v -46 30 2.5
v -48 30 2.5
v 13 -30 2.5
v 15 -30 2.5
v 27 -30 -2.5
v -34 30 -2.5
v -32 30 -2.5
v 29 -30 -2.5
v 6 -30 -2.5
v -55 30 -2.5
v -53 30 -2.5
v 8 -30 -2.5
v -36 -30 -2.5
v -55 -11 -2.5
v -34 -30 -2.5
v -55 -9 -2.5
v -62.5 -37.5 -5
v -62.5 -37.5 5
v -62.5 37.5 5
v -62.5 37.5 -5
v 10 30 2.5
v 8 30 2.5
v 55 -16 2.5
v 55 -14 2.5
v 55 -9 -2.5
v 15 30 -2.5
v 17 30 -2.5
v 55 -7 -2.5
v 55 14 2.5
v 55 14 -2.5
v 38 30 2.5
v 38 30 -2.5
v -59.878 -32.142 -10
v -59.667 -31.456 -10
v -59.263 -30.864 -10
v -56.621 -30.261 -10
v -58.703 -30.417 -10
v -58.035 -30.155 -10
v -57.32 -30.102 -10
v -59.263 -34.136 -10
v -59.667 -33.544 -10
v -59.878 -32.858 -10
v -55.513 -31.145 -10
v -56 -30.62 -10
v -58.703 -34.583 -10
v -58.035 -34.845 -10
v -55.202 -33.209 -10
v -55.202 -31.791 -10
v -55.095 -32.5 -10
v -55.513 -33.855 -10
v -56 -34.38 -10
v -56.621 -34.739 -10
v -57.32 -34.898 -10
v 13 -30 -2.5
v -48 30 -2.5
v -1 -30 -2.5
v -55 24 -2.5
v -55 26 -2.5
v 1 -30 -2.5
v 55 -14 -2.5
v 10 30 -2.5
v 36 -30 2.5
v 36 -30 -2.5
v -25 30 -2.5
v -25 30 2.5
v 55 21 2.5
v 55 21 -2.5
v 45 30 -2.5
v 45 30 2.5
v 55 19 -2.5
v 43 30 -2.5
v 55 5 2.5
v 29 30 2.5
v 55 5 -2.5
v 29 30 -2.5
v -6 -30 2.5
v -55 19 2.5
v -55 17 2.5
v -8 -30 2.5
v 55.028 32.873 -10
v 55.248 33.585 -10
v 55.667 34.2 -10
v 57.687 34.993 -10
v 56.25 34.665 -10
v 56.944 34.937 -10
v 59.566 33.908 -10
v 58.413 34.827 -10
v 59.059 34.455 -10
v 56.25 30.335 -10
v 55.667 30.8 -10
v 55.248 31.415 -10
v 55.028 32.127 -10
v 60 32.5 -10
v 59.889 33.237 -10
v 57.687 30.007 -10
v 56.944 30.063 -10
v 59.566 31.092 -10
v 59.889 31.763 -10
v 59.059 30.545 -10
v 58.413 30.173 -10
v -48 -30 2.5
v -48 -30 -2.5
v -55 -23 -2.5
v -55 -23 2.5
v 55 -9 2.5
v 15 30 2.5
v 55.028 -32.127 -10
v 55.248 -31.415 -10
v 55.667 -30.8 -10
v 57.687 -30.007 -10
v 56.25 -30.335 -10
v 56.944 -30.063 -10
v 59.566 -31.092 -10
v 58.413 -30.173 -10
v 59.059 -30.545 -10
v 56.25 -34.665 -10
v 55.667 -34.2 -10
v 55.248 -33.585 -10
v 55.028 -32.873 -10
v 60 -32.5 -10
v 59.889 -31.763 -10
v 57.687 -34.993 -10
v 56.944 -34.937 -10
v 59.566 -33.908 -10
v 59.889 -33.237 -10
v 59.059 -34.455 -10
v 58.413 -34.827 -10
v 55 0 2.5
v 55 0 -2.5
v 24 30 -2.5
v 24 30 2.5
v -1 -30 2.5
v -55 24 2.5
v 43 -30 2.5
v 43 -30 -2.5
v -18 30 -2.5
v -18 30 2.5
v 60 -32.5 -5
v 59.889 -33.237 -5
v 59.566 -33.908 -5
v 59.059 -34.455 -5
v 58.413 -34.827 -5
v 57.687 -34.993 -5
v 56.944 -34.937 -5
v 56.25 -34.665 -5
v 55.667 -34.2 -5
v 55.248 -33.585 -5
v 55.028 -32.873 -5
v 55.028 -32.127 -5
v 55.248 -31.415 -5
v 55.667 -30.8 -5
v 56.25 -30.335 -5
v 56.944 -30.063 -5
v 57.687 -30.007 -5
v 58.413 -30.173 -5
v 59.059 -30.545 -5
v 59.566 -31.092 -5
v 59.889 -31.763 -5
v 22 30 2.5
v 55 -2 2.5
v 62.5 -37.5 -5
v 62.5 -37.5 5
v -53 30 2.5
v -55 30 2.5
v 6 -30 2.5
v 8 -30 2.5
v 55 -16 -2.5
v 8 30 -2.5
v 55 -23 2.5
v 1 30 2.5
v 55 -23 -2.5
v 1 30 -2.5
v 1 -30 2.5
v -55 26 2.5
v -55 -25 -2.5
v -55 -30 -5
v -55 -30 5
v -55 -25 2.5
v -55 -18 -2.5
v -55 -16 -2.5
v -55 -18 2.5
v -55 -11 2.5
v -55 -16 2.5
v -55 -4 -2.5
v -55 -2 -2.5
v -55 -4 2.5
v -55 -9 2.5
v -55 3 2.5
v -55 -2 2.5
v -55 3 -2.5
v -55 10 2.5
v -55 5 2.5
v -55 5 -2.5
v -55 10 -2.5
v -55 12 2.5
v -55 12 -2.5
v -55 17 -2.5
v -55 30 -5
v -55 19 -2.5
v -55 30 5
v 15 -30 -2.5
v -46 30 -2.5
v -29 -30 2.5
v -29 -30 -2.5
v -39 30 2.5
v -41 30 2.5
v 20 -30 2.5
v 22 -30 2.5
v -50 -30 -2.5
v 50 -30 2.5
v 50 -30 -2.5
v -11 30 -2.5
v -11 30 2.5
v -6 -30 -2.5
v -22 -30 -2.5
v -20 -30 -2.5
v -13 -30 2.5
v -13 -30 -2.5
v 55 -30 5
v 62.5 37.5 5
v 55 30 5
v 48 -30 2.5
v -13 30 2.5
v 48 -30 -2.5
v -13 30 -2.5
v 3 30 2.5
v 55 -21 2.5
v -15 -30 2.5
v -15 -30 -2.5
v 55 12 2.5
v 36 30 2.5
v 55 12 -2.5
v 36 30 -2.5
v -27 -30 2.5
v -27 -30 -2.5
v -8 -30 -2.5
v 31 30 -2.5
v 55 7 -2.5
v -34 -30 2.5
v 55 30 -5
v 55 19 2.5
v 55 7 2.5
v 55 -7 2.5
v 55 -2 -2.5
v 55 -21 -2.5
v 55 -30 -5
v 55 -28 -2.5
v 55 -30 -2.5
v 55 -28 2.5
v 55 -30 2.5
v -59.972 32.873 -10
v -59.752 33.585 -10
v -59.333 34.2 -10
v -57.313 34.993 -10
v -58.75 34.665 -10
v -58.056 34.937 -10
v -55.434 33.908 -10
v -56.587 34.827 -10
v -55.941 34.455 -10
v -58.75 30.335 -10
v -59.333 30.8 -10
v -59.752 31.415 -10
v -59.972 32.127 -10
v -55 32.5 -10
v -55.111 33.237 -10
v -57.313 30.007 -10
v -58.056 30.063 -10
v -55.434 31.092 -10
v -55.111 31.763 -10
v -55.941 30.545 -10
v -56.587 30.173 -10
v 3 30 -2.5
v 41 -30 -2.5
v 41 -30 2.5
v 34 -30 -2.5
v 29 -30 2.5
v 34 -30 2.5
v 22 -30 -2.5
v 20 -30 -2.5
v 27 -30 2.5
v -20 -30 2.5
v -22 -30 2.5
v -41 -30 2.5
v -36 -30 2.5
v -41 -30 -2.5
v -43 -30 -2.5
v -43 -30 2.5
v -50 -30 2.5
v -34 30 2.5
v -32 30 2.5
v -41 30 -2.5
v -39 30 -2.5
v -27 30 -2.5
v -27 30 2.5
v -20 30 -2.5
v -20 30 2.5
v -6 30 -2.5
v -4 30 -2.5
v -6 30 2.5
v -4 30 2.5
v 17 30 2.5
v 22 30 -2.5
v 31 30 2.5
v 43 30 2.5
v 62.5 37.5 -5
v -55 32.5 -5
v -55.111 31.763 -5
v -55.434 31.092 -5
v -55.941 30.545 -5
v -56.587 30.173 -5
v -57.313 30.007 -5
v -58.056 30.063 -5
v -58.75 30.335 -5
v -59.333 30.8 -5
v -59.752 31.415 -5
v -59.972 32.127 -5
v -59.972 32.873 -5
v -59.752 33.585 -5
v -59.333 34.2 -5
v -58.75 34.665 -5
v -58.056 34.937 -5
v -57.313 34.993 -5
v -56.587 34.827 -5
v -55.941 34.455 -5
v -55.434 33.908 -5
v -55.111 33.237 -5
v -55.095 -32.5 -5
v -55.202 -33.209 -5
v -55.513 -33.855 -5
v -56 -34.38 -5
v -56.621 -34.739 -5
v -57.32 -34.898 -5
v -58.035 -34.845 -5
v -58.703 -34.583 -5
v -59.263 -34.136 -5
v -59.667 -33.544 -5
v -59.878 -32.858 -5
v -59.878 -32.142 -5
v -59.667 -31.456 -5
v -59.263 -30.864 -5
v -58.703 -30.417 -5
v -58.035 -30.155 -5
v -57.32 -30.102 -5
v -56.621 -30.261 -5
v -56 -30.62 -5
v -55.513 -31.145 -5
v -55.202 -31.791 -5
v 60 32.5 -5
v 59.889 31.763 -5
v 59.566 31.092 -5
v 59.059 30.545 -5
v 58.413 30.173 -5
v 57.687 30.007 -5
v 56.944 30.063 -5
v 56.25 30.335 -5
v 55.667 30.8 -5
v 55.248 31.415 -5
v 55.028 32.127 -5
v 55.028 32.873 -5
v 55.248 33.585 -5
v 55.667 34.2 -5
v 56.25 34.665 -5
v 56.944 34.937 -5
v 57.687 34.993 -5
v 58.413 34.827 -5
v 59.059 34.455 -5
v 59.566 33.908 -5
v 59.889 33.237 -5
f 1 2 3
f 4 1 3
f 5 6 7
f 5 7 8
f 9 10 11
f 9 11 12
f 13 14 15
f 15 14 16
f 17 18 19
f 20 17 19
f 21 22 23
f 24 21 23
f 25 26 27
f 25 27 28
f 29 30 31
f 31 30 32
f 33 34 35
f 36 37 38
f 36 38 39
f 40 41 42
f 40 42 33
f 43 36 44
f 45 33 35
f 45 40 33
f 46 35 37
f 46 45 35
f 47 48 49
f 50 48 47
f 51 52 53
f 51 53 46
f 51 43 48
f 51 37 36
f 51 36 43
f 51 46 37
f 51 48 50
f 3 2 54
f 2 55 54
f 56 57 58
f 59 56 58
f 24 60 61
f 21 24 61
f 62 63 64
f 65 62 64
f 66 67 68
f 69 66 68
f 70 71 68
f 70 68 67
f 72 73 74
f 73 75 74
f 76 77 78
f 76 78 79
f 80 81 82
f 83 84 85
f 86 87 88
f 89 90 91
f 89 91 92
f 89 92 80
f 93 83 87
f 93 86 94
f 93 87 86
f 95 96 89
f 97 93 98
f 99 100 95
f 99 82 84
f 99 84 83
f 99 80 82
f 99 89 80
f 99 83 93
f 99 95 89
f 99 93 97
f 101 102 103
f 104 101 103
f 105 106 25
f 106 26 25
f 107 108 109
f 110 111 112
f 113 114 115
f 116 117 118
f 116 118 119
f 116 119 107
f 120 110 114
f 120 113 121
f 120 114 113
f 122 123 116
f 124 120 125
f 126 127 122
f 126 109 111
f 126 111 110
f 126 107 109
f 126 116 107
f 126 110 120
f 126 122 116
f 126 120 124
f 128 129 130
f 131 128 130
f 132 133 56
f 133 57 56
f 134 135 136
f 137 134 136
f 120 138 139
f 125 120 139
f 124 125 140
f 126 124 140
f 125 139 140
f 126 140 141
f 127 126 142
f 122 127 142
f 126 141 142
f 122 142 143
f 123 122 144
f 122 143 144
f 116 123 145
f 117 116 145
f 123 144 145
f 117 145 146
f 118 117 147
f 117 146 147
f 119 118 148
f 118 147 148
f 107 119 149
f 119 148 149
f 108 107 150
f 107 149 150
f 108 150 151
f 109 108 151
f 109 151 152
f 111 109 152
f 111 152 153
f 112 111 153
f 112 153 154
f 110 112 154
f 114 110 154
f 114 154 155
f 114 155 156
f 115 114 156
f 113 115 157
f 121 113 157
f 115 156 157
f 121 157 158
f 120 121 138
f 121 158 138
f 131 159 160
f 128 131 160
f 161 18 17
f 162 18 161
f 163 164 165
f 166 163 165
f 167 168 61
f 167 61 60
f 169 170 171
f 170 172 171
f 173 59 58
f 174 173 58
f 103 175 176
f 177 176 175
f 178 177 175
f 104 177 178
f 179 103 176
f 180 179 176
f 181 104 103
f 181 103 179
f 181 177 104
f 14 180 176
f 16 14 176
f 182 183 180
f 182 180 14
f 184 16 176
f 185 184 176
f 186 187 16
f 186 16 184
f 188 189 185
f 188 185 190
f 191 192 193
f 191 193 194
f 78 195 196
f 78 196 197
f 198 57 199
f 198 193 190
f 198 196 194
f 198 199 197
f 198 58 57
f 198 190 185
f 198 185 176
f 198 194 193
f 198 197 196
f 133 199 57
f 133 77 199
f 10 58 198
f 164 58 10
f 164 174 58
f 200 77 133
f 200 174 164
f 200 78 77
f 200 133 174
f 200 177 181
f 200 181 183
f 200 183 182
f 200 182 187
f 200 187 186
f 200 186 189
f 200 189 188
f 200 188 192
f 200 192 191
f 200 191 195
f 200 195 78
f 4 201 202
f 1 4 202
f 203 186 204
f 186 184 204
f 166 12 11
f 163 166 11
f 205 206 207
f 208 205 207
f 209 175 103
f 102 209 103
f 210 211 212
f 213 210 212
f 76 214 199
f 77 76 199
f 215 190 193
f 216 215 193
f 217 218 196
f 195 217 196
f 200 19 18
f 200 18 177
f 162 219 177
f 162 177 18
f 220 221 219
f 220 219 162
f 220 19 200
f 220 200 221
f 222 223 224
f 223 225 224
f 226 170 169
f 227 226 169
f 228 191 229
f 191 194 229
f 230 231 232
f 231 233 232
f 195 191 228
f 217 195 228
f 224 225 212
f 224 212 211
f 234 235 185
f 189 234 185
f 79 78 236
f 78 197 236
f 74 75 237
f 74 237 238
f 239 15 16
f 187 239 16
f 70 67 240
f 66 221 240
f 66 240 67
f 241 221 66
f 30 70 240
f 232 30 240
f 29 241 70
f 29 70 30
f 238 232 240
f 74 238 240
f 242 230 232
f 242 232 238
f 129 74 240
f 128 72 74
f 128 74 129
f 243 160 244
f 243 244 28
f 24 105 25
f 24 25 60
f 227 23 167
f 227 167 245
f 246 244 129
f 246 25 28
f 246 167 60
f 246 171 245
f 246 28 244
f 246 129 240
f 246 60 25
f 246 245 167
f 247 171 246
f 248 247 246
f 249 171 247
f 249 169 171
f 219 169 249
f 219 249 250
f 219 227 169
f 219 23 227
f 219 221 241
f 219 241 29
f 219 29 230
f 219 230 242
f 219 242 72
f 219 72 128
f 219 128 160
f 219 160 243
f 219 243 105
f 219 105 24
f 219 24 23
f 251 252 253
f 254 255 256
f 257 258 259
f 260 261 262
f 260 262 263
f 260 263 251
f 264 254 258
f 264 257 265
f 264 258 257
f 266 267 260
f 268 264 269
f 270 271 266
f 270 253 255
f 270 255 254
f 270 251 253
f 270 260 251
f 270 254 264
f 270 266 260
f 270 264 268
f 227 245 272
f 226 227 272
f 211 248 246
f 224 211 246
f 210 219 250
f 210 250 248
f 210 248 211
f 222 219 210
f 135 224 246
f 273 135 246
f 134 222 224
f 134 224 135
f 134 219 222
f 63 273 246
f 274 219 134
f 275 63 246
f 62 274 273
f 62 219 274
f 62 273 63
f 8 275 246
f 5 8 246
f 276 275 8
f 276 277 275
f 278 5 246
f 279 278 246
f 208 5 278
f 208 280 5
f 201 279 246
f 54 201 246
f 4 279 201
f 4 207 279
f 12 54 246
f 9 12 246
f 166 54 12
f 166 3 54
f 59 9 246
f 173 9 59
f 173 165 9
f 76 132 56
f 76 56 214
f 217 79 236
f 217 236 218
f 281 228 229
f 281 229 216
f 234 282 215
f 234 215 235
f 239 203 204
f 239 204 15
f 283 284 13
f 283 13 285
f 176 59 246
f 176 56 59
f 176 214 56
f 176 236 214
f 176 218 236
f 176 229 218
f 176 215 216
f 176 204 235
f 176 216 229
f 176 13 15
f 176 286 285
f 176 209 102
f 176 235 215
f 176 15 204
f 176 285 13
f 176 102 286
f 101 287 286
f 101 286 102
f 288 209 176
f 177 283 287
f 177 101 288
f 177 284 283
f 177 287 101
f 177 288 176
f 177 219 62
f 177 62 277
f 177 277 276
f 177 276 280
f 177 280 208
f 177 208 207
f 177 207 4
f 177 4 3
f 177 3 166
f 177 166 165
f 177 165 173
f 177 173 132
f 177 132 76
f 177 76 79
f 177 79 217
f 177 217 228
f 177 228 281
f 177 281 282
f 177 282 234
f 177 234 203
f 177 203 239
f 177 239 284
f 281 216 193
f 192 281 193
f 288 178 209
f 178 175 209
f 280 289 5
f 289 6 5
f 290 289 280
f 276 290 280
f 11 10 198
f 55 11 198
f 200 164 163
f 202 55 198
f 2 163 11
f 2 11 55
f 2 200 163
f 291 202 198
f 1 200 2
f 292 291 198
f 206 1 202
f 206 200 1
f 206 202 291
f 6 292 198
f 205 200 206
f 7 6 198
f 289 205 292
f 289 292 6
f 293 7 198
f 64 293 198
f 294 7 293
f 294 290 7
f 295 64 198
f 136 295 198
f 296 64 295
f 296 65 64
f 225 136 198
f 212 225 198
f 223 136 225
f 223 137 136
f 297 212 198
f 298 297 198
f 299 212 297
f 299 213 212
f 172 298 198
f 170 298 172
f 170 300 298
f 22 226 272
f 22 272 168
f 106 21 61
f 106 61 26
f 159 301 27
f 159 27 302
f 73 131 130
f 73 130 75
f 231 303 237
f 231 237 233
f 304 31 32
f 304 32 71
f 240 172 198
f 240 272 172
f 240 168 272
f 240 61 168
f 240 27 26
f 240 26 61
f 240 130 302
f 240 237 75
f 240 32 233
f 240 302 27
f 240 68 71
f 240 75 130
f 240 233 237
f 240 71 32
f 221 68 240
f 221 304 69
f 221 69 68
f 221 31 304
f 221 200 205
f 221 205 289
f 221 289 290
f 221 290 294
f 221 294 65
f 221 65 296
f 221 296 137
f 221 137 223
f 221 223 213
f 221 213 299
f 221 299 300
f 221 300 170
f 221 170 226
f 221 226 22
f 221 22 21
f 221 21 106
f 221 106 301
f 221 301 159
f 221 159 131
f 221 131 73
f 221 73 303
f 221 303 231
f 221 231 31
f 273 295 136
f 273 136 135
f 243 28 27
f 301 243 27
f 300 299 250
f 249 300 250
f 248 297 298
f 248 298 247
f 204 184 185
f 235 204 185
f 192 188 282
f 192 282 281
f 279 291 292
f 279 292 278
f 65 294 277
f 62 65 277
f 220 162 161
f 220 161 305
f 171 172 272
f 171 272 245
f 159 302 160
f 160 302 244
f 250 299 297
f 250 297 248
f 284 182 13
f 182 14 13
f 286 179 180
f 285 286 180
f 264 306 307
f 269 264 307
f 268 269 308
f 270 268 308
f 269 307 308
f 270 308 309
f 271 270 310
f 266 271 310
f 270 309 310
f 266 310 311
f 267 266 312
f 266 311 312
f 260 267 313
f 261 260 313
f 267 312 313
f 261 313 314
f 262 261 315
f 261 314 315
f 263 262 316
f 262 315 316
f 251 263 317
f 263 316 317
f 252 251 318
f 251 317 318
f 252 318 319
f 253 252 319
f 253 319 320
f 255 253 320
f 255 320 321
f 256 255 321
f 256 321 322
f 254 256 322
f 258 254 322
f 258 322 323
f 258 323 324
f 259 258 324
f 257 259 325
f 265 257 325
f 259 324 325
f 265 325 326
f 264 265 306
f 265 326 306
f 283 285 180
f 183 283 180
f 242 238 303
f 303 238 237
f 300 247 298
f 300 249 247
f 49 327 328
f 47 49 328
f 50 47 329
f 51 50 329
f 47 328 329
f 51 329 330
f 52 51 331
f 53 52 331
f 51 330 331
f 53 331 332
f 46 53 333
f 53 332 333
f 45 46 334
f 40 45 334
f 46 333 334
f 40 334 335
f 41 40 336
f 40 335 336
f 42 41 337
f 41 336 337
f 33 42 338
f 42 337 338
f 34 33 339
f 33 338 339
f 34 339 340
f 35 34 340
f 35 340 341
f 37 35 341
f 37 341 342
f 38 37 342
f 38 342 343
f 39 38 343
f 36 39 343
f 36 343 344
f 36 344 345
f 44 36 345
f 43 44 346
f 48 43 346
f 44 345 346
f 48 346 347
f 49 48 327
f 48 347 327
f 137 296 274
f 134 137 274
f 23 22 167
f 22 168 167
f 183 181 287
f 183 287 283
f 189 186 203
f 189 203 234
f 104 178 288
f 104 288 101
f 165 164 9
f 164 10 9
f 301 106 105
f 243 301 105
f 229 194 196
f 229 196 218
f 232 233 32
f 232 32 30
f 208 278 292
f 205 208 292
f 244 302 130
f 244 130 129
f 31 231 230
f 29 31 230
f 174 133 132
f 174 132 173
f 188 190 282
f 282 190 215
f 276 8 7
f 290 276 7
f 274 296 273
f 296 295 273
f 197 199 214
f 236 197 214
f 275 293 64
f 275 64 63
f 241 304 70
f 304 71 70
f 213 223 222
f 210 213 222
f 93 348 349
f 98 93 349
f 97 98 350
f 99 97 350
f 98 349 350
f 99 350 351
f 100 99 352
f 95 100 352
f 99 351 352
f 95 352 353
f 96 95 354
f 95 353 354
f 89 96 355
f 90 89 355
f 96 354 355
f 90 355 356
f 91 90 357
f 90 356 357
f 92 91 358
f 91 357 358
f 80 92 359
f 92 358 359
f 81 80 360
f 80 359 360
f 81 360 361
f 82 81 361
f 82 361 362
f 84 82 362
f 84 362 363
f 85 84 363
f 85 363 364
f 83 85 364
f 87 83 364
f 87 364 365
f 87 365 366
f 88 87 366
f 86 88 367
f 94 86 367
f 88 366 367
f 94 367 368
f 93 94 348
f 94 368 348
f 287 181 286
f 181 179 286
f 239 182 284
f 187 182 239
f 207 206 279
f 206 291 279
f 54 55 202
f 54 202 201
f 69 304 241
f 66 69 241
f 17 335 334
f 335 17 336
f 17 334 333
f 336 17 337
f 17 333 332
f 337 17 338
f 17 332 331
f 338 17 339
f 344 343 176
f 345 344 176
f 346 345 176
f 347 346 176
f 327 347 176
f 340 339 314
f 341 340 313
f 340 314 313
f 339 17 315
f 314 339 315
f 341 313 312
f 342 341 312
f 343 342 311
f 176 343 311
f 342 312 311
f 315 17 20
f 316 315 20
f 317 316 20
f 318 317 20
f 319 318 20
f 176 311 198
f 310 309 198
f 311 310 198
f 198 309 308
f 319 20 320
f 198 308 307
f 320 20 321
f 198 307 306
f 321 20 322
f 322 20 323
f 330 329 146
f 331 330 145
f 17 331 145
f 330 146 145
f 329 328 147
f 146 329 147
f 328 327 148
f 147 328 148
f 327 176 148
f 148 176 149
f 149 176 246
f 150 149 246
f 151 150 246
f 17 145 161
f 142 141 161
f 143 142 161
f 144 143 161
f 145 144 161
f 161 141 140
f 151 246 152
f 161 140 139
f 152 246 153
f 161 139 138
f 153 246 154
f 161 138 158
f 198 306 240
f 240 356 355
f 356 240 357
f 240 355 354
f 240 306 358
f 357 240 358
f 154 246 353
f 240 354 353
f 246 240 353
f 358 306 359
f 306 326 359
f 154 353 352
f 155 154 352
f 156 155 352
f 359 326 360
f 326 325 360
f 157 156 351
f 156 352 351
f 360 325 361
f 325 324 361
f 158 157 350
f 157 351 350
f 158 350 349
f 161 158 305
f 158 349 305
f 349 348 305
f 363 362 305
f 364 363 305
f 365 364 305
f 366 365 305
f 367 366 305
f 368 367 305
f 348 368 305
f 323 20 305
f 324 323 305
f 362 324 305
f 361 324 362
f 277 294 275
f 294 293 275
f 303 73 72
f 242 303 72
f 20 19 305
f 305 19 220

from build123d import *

# Parameters (mm, degrees)
F0_W     = 125
F0_H     = 75
F1_DEPTH = 5
F2_DEPTH = 2.5
F3_R     = 2.405164
F3_R_2   = 2.5
F4_DEPTH = 5


with BuildPart() as f1:
    # F0 (on Top) → F1 (new body, symmetric)
    with BuildSketch(Plane.XY):
        Rectangle(F0_W, F0_H)
        Polygon((-55, 26), (-55, 30), (-53, 30), (-48, 30), (-46, 30), (-41, 30), (-39, 30), (-34, 30), (-32, 30), (-27, 30), (-25, 30), (-20, 30), (-18, 30), (-13, 30), (-11, 30), (-6, 30), (-4, 30), (1, 30), (3, 30), (8, 30), (10, 30), (15, 30), (17, 30), (22, 30), (24, 30), (29, 30), (31, 30), (36, 30), (38, 30), (43, 30), (45, 30), (55, 30), (55, 20.999727), (55, 18.999727), (55, 13.999727), (55, 11.999727), (55, 6.999727), (55, 4.999727), (55, -0.000273), (55, -2.000273), (55, -7.000273), (55, -9.000273), (55, -14.000273), (55, -16.000273), (55, -21.000273), (55, -23.000273), (55, -28), (55, -30), (50, -30), (48, -30), (43, -30), (41, -30), (36, -30), (34, -30), (29, -30), (27, -30), (22, -30), (20, -30), (15, -30), (13, -30), (8, -30), (6, -30), (1, -30), (-1, -30), (-6, -30), (-8, -30), (-13, -30), (-15, -30), (-20, -30), (-22, -30), (-27, -30), (-29, -30), (-34, -30), (-36, -30), (-41, -30), (-43, -30), (-48, -30), (-50, -30), (-55, -30), (-55, -25), (-55, -23), (-55, -18), (-55, -16), (-55, -11), (-55, -9), (-55, -4), (-55, -2), (-55, 3), (-55, 5), (-55, 10), (-55, 12), (-55, 17), (-55, 19), (-55, 24), align=None, mode=Mode.SUBTRACT)
    extrude(amount=F1_DEPTH, both=True)

    # F0 (on Top) → F2 (join, symmetric)
    with BuildSketch(Plane.XY):
        Polygon((-48, -30), (-55, -23), (-55, -25), (-50, -30), align=None)
        Polygon((-41, -30), (-55, -16), (-55, -18), (-43, -30), align=None)
        Polygon((-34, -30), (-55, -9), (-55, -11), (-36, -30), align=None)
        Polygon((-27, -30), (-55, -2), (-55, -4), (-29, -30), align=None)
        Polygon((-20, -30), (-55, 5), (-55, 3), (-22, -30), align=None)
        Polygon((-13, -30), (-55, 12), (-55, 10), (-15, -30), align=None)
        Polygon((-6, -30), (-55, 19), (-55, 17), (-8, -30), align=None)
        Polygon((1, -30), (-55, 26), (-55, 24), (-1, -30), align=None)
        Polygon((-53, 30), (-55, 30), (6, -30), (8, -30), align=None)
        Polygon((-46, 30), (-48, 30), (13, -30), (15, -30), align=None)
        Polygon((-39, 30), (-41, 30), (20, -30), (22, -30), align=None)
        Polygon((-32, 30), (-34, 30), (27, -30), (29, -30), align=None)
        Polygon((-25, 30), (-27, 30), (34, -30), (36, -30), align=None)
        Polygon((-18, 30), (-20, 30), (41, -30), (43, -30), align=None)
        Polygon((-11, 30), (-13, 30), (48, -30), (50, -30), align=None)
        Polygon((3, 30), (1, 30), (55, -23.000273), (55, -21.000273), align=None)
        Polygon((10, 30), (8, 30), (55, -16.000273), (55, -14.000273), align=None)
        Polygon((45, 30), (43, 30), (55, 18.999727), (55, 20.999727), align=None)
        Polygon((38, 30), (36, 30), (55, 11.999727), (55, 13.999727), align=None)
        Polygon((31, 30), (29, 30), (55, 4.999727), (55, 6.999727), align=None)
        Polygon((24, 30), (22, 30), (55, -2.000273), (55, -0.000273), align=None)
        Polygon((17, 30), (15, 30), (55, -9.000273), (55, -7.000273), align=None)
        Polygon((-4, 30), (-6, 30), (55, -30), (55, -28), align=None)
    extrude(amount=F2_DEPTH, both=True)

    # F3 (on face) → F4 (join)
    with BuildSketch(Plane(origin=(0, 0, -5), x_dir=(1, 0, 0), z_dir=(0, 0, -1))):
        with Locations((-57.5, 32.5)):
            Circle(F3_R)
        with Locations((57.5, 32.5)):
            Circle(F3_R_2)
        with Locations((57.5, -32.5)):
            Circle(F3_R_2)
        with Locations((-57.5, -32.5)):
            Circle(F3_R_2)
    extrude(amount=F4_DEPTH)


solid = f1.part
